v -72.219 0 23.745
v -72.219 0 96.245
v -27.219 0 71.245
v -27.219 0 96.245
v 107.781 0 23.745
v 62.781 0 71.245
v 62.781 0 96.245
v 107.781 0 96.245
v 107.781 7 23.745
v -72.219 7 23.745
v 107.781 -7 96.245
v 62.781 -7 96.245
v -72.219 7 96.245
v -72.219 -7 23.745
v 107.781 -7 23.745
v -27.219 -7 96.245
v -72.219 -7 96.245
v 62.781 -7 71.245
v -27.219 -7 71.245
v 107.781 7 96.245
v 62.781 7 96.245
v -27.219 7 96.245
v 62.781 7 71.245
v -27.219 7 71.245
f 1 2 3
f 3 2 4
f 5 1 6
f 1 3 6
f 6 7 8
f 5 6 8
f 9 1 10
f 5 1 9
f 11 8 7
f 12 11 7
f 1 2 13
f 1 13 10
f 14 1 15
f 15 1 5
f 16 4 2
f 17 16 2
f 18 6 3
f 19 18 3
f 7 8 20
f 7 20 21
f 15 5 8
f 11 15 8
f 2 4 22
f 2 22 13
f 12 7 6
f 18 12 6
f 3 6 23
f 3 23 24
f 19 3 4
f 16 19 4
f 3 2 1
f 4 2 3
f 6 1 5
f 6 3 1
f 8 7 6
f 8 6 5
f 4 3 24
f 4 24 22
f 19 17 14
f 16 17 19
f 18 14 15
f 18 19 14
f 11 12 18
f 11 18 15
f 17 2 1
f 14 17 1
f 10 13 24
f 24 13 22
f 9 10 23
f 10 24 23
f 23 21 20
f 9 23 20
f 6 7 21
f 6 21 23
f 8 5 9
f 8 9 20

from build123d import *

# Parameters (mm, degrees)
F1_DEPTH = 7


with BuildPart() as f1:
    # F0 (on Front) → F1 (new body)
    with BuildSketch(Plane.XZ):
        Polygon((-72.21858, 96.245216), (-72.21858, 38.42797), (-72.21858, 23.745216), (107.78142, 23.745216), (107.78142, 96.245216), (62.78142, 96.245216), (62.78142, 71.245216), (-27.21858, 71.245216), (-27.21858, 96.245216), align=None)
    extrude(amount=F1_DEPTH)


with BuildPart() as f2_1:
    # F2: instance of F1
    add(f1.part.mirror(Plane.XZ))


solid = Compound([f1.part, f2_1.part])
